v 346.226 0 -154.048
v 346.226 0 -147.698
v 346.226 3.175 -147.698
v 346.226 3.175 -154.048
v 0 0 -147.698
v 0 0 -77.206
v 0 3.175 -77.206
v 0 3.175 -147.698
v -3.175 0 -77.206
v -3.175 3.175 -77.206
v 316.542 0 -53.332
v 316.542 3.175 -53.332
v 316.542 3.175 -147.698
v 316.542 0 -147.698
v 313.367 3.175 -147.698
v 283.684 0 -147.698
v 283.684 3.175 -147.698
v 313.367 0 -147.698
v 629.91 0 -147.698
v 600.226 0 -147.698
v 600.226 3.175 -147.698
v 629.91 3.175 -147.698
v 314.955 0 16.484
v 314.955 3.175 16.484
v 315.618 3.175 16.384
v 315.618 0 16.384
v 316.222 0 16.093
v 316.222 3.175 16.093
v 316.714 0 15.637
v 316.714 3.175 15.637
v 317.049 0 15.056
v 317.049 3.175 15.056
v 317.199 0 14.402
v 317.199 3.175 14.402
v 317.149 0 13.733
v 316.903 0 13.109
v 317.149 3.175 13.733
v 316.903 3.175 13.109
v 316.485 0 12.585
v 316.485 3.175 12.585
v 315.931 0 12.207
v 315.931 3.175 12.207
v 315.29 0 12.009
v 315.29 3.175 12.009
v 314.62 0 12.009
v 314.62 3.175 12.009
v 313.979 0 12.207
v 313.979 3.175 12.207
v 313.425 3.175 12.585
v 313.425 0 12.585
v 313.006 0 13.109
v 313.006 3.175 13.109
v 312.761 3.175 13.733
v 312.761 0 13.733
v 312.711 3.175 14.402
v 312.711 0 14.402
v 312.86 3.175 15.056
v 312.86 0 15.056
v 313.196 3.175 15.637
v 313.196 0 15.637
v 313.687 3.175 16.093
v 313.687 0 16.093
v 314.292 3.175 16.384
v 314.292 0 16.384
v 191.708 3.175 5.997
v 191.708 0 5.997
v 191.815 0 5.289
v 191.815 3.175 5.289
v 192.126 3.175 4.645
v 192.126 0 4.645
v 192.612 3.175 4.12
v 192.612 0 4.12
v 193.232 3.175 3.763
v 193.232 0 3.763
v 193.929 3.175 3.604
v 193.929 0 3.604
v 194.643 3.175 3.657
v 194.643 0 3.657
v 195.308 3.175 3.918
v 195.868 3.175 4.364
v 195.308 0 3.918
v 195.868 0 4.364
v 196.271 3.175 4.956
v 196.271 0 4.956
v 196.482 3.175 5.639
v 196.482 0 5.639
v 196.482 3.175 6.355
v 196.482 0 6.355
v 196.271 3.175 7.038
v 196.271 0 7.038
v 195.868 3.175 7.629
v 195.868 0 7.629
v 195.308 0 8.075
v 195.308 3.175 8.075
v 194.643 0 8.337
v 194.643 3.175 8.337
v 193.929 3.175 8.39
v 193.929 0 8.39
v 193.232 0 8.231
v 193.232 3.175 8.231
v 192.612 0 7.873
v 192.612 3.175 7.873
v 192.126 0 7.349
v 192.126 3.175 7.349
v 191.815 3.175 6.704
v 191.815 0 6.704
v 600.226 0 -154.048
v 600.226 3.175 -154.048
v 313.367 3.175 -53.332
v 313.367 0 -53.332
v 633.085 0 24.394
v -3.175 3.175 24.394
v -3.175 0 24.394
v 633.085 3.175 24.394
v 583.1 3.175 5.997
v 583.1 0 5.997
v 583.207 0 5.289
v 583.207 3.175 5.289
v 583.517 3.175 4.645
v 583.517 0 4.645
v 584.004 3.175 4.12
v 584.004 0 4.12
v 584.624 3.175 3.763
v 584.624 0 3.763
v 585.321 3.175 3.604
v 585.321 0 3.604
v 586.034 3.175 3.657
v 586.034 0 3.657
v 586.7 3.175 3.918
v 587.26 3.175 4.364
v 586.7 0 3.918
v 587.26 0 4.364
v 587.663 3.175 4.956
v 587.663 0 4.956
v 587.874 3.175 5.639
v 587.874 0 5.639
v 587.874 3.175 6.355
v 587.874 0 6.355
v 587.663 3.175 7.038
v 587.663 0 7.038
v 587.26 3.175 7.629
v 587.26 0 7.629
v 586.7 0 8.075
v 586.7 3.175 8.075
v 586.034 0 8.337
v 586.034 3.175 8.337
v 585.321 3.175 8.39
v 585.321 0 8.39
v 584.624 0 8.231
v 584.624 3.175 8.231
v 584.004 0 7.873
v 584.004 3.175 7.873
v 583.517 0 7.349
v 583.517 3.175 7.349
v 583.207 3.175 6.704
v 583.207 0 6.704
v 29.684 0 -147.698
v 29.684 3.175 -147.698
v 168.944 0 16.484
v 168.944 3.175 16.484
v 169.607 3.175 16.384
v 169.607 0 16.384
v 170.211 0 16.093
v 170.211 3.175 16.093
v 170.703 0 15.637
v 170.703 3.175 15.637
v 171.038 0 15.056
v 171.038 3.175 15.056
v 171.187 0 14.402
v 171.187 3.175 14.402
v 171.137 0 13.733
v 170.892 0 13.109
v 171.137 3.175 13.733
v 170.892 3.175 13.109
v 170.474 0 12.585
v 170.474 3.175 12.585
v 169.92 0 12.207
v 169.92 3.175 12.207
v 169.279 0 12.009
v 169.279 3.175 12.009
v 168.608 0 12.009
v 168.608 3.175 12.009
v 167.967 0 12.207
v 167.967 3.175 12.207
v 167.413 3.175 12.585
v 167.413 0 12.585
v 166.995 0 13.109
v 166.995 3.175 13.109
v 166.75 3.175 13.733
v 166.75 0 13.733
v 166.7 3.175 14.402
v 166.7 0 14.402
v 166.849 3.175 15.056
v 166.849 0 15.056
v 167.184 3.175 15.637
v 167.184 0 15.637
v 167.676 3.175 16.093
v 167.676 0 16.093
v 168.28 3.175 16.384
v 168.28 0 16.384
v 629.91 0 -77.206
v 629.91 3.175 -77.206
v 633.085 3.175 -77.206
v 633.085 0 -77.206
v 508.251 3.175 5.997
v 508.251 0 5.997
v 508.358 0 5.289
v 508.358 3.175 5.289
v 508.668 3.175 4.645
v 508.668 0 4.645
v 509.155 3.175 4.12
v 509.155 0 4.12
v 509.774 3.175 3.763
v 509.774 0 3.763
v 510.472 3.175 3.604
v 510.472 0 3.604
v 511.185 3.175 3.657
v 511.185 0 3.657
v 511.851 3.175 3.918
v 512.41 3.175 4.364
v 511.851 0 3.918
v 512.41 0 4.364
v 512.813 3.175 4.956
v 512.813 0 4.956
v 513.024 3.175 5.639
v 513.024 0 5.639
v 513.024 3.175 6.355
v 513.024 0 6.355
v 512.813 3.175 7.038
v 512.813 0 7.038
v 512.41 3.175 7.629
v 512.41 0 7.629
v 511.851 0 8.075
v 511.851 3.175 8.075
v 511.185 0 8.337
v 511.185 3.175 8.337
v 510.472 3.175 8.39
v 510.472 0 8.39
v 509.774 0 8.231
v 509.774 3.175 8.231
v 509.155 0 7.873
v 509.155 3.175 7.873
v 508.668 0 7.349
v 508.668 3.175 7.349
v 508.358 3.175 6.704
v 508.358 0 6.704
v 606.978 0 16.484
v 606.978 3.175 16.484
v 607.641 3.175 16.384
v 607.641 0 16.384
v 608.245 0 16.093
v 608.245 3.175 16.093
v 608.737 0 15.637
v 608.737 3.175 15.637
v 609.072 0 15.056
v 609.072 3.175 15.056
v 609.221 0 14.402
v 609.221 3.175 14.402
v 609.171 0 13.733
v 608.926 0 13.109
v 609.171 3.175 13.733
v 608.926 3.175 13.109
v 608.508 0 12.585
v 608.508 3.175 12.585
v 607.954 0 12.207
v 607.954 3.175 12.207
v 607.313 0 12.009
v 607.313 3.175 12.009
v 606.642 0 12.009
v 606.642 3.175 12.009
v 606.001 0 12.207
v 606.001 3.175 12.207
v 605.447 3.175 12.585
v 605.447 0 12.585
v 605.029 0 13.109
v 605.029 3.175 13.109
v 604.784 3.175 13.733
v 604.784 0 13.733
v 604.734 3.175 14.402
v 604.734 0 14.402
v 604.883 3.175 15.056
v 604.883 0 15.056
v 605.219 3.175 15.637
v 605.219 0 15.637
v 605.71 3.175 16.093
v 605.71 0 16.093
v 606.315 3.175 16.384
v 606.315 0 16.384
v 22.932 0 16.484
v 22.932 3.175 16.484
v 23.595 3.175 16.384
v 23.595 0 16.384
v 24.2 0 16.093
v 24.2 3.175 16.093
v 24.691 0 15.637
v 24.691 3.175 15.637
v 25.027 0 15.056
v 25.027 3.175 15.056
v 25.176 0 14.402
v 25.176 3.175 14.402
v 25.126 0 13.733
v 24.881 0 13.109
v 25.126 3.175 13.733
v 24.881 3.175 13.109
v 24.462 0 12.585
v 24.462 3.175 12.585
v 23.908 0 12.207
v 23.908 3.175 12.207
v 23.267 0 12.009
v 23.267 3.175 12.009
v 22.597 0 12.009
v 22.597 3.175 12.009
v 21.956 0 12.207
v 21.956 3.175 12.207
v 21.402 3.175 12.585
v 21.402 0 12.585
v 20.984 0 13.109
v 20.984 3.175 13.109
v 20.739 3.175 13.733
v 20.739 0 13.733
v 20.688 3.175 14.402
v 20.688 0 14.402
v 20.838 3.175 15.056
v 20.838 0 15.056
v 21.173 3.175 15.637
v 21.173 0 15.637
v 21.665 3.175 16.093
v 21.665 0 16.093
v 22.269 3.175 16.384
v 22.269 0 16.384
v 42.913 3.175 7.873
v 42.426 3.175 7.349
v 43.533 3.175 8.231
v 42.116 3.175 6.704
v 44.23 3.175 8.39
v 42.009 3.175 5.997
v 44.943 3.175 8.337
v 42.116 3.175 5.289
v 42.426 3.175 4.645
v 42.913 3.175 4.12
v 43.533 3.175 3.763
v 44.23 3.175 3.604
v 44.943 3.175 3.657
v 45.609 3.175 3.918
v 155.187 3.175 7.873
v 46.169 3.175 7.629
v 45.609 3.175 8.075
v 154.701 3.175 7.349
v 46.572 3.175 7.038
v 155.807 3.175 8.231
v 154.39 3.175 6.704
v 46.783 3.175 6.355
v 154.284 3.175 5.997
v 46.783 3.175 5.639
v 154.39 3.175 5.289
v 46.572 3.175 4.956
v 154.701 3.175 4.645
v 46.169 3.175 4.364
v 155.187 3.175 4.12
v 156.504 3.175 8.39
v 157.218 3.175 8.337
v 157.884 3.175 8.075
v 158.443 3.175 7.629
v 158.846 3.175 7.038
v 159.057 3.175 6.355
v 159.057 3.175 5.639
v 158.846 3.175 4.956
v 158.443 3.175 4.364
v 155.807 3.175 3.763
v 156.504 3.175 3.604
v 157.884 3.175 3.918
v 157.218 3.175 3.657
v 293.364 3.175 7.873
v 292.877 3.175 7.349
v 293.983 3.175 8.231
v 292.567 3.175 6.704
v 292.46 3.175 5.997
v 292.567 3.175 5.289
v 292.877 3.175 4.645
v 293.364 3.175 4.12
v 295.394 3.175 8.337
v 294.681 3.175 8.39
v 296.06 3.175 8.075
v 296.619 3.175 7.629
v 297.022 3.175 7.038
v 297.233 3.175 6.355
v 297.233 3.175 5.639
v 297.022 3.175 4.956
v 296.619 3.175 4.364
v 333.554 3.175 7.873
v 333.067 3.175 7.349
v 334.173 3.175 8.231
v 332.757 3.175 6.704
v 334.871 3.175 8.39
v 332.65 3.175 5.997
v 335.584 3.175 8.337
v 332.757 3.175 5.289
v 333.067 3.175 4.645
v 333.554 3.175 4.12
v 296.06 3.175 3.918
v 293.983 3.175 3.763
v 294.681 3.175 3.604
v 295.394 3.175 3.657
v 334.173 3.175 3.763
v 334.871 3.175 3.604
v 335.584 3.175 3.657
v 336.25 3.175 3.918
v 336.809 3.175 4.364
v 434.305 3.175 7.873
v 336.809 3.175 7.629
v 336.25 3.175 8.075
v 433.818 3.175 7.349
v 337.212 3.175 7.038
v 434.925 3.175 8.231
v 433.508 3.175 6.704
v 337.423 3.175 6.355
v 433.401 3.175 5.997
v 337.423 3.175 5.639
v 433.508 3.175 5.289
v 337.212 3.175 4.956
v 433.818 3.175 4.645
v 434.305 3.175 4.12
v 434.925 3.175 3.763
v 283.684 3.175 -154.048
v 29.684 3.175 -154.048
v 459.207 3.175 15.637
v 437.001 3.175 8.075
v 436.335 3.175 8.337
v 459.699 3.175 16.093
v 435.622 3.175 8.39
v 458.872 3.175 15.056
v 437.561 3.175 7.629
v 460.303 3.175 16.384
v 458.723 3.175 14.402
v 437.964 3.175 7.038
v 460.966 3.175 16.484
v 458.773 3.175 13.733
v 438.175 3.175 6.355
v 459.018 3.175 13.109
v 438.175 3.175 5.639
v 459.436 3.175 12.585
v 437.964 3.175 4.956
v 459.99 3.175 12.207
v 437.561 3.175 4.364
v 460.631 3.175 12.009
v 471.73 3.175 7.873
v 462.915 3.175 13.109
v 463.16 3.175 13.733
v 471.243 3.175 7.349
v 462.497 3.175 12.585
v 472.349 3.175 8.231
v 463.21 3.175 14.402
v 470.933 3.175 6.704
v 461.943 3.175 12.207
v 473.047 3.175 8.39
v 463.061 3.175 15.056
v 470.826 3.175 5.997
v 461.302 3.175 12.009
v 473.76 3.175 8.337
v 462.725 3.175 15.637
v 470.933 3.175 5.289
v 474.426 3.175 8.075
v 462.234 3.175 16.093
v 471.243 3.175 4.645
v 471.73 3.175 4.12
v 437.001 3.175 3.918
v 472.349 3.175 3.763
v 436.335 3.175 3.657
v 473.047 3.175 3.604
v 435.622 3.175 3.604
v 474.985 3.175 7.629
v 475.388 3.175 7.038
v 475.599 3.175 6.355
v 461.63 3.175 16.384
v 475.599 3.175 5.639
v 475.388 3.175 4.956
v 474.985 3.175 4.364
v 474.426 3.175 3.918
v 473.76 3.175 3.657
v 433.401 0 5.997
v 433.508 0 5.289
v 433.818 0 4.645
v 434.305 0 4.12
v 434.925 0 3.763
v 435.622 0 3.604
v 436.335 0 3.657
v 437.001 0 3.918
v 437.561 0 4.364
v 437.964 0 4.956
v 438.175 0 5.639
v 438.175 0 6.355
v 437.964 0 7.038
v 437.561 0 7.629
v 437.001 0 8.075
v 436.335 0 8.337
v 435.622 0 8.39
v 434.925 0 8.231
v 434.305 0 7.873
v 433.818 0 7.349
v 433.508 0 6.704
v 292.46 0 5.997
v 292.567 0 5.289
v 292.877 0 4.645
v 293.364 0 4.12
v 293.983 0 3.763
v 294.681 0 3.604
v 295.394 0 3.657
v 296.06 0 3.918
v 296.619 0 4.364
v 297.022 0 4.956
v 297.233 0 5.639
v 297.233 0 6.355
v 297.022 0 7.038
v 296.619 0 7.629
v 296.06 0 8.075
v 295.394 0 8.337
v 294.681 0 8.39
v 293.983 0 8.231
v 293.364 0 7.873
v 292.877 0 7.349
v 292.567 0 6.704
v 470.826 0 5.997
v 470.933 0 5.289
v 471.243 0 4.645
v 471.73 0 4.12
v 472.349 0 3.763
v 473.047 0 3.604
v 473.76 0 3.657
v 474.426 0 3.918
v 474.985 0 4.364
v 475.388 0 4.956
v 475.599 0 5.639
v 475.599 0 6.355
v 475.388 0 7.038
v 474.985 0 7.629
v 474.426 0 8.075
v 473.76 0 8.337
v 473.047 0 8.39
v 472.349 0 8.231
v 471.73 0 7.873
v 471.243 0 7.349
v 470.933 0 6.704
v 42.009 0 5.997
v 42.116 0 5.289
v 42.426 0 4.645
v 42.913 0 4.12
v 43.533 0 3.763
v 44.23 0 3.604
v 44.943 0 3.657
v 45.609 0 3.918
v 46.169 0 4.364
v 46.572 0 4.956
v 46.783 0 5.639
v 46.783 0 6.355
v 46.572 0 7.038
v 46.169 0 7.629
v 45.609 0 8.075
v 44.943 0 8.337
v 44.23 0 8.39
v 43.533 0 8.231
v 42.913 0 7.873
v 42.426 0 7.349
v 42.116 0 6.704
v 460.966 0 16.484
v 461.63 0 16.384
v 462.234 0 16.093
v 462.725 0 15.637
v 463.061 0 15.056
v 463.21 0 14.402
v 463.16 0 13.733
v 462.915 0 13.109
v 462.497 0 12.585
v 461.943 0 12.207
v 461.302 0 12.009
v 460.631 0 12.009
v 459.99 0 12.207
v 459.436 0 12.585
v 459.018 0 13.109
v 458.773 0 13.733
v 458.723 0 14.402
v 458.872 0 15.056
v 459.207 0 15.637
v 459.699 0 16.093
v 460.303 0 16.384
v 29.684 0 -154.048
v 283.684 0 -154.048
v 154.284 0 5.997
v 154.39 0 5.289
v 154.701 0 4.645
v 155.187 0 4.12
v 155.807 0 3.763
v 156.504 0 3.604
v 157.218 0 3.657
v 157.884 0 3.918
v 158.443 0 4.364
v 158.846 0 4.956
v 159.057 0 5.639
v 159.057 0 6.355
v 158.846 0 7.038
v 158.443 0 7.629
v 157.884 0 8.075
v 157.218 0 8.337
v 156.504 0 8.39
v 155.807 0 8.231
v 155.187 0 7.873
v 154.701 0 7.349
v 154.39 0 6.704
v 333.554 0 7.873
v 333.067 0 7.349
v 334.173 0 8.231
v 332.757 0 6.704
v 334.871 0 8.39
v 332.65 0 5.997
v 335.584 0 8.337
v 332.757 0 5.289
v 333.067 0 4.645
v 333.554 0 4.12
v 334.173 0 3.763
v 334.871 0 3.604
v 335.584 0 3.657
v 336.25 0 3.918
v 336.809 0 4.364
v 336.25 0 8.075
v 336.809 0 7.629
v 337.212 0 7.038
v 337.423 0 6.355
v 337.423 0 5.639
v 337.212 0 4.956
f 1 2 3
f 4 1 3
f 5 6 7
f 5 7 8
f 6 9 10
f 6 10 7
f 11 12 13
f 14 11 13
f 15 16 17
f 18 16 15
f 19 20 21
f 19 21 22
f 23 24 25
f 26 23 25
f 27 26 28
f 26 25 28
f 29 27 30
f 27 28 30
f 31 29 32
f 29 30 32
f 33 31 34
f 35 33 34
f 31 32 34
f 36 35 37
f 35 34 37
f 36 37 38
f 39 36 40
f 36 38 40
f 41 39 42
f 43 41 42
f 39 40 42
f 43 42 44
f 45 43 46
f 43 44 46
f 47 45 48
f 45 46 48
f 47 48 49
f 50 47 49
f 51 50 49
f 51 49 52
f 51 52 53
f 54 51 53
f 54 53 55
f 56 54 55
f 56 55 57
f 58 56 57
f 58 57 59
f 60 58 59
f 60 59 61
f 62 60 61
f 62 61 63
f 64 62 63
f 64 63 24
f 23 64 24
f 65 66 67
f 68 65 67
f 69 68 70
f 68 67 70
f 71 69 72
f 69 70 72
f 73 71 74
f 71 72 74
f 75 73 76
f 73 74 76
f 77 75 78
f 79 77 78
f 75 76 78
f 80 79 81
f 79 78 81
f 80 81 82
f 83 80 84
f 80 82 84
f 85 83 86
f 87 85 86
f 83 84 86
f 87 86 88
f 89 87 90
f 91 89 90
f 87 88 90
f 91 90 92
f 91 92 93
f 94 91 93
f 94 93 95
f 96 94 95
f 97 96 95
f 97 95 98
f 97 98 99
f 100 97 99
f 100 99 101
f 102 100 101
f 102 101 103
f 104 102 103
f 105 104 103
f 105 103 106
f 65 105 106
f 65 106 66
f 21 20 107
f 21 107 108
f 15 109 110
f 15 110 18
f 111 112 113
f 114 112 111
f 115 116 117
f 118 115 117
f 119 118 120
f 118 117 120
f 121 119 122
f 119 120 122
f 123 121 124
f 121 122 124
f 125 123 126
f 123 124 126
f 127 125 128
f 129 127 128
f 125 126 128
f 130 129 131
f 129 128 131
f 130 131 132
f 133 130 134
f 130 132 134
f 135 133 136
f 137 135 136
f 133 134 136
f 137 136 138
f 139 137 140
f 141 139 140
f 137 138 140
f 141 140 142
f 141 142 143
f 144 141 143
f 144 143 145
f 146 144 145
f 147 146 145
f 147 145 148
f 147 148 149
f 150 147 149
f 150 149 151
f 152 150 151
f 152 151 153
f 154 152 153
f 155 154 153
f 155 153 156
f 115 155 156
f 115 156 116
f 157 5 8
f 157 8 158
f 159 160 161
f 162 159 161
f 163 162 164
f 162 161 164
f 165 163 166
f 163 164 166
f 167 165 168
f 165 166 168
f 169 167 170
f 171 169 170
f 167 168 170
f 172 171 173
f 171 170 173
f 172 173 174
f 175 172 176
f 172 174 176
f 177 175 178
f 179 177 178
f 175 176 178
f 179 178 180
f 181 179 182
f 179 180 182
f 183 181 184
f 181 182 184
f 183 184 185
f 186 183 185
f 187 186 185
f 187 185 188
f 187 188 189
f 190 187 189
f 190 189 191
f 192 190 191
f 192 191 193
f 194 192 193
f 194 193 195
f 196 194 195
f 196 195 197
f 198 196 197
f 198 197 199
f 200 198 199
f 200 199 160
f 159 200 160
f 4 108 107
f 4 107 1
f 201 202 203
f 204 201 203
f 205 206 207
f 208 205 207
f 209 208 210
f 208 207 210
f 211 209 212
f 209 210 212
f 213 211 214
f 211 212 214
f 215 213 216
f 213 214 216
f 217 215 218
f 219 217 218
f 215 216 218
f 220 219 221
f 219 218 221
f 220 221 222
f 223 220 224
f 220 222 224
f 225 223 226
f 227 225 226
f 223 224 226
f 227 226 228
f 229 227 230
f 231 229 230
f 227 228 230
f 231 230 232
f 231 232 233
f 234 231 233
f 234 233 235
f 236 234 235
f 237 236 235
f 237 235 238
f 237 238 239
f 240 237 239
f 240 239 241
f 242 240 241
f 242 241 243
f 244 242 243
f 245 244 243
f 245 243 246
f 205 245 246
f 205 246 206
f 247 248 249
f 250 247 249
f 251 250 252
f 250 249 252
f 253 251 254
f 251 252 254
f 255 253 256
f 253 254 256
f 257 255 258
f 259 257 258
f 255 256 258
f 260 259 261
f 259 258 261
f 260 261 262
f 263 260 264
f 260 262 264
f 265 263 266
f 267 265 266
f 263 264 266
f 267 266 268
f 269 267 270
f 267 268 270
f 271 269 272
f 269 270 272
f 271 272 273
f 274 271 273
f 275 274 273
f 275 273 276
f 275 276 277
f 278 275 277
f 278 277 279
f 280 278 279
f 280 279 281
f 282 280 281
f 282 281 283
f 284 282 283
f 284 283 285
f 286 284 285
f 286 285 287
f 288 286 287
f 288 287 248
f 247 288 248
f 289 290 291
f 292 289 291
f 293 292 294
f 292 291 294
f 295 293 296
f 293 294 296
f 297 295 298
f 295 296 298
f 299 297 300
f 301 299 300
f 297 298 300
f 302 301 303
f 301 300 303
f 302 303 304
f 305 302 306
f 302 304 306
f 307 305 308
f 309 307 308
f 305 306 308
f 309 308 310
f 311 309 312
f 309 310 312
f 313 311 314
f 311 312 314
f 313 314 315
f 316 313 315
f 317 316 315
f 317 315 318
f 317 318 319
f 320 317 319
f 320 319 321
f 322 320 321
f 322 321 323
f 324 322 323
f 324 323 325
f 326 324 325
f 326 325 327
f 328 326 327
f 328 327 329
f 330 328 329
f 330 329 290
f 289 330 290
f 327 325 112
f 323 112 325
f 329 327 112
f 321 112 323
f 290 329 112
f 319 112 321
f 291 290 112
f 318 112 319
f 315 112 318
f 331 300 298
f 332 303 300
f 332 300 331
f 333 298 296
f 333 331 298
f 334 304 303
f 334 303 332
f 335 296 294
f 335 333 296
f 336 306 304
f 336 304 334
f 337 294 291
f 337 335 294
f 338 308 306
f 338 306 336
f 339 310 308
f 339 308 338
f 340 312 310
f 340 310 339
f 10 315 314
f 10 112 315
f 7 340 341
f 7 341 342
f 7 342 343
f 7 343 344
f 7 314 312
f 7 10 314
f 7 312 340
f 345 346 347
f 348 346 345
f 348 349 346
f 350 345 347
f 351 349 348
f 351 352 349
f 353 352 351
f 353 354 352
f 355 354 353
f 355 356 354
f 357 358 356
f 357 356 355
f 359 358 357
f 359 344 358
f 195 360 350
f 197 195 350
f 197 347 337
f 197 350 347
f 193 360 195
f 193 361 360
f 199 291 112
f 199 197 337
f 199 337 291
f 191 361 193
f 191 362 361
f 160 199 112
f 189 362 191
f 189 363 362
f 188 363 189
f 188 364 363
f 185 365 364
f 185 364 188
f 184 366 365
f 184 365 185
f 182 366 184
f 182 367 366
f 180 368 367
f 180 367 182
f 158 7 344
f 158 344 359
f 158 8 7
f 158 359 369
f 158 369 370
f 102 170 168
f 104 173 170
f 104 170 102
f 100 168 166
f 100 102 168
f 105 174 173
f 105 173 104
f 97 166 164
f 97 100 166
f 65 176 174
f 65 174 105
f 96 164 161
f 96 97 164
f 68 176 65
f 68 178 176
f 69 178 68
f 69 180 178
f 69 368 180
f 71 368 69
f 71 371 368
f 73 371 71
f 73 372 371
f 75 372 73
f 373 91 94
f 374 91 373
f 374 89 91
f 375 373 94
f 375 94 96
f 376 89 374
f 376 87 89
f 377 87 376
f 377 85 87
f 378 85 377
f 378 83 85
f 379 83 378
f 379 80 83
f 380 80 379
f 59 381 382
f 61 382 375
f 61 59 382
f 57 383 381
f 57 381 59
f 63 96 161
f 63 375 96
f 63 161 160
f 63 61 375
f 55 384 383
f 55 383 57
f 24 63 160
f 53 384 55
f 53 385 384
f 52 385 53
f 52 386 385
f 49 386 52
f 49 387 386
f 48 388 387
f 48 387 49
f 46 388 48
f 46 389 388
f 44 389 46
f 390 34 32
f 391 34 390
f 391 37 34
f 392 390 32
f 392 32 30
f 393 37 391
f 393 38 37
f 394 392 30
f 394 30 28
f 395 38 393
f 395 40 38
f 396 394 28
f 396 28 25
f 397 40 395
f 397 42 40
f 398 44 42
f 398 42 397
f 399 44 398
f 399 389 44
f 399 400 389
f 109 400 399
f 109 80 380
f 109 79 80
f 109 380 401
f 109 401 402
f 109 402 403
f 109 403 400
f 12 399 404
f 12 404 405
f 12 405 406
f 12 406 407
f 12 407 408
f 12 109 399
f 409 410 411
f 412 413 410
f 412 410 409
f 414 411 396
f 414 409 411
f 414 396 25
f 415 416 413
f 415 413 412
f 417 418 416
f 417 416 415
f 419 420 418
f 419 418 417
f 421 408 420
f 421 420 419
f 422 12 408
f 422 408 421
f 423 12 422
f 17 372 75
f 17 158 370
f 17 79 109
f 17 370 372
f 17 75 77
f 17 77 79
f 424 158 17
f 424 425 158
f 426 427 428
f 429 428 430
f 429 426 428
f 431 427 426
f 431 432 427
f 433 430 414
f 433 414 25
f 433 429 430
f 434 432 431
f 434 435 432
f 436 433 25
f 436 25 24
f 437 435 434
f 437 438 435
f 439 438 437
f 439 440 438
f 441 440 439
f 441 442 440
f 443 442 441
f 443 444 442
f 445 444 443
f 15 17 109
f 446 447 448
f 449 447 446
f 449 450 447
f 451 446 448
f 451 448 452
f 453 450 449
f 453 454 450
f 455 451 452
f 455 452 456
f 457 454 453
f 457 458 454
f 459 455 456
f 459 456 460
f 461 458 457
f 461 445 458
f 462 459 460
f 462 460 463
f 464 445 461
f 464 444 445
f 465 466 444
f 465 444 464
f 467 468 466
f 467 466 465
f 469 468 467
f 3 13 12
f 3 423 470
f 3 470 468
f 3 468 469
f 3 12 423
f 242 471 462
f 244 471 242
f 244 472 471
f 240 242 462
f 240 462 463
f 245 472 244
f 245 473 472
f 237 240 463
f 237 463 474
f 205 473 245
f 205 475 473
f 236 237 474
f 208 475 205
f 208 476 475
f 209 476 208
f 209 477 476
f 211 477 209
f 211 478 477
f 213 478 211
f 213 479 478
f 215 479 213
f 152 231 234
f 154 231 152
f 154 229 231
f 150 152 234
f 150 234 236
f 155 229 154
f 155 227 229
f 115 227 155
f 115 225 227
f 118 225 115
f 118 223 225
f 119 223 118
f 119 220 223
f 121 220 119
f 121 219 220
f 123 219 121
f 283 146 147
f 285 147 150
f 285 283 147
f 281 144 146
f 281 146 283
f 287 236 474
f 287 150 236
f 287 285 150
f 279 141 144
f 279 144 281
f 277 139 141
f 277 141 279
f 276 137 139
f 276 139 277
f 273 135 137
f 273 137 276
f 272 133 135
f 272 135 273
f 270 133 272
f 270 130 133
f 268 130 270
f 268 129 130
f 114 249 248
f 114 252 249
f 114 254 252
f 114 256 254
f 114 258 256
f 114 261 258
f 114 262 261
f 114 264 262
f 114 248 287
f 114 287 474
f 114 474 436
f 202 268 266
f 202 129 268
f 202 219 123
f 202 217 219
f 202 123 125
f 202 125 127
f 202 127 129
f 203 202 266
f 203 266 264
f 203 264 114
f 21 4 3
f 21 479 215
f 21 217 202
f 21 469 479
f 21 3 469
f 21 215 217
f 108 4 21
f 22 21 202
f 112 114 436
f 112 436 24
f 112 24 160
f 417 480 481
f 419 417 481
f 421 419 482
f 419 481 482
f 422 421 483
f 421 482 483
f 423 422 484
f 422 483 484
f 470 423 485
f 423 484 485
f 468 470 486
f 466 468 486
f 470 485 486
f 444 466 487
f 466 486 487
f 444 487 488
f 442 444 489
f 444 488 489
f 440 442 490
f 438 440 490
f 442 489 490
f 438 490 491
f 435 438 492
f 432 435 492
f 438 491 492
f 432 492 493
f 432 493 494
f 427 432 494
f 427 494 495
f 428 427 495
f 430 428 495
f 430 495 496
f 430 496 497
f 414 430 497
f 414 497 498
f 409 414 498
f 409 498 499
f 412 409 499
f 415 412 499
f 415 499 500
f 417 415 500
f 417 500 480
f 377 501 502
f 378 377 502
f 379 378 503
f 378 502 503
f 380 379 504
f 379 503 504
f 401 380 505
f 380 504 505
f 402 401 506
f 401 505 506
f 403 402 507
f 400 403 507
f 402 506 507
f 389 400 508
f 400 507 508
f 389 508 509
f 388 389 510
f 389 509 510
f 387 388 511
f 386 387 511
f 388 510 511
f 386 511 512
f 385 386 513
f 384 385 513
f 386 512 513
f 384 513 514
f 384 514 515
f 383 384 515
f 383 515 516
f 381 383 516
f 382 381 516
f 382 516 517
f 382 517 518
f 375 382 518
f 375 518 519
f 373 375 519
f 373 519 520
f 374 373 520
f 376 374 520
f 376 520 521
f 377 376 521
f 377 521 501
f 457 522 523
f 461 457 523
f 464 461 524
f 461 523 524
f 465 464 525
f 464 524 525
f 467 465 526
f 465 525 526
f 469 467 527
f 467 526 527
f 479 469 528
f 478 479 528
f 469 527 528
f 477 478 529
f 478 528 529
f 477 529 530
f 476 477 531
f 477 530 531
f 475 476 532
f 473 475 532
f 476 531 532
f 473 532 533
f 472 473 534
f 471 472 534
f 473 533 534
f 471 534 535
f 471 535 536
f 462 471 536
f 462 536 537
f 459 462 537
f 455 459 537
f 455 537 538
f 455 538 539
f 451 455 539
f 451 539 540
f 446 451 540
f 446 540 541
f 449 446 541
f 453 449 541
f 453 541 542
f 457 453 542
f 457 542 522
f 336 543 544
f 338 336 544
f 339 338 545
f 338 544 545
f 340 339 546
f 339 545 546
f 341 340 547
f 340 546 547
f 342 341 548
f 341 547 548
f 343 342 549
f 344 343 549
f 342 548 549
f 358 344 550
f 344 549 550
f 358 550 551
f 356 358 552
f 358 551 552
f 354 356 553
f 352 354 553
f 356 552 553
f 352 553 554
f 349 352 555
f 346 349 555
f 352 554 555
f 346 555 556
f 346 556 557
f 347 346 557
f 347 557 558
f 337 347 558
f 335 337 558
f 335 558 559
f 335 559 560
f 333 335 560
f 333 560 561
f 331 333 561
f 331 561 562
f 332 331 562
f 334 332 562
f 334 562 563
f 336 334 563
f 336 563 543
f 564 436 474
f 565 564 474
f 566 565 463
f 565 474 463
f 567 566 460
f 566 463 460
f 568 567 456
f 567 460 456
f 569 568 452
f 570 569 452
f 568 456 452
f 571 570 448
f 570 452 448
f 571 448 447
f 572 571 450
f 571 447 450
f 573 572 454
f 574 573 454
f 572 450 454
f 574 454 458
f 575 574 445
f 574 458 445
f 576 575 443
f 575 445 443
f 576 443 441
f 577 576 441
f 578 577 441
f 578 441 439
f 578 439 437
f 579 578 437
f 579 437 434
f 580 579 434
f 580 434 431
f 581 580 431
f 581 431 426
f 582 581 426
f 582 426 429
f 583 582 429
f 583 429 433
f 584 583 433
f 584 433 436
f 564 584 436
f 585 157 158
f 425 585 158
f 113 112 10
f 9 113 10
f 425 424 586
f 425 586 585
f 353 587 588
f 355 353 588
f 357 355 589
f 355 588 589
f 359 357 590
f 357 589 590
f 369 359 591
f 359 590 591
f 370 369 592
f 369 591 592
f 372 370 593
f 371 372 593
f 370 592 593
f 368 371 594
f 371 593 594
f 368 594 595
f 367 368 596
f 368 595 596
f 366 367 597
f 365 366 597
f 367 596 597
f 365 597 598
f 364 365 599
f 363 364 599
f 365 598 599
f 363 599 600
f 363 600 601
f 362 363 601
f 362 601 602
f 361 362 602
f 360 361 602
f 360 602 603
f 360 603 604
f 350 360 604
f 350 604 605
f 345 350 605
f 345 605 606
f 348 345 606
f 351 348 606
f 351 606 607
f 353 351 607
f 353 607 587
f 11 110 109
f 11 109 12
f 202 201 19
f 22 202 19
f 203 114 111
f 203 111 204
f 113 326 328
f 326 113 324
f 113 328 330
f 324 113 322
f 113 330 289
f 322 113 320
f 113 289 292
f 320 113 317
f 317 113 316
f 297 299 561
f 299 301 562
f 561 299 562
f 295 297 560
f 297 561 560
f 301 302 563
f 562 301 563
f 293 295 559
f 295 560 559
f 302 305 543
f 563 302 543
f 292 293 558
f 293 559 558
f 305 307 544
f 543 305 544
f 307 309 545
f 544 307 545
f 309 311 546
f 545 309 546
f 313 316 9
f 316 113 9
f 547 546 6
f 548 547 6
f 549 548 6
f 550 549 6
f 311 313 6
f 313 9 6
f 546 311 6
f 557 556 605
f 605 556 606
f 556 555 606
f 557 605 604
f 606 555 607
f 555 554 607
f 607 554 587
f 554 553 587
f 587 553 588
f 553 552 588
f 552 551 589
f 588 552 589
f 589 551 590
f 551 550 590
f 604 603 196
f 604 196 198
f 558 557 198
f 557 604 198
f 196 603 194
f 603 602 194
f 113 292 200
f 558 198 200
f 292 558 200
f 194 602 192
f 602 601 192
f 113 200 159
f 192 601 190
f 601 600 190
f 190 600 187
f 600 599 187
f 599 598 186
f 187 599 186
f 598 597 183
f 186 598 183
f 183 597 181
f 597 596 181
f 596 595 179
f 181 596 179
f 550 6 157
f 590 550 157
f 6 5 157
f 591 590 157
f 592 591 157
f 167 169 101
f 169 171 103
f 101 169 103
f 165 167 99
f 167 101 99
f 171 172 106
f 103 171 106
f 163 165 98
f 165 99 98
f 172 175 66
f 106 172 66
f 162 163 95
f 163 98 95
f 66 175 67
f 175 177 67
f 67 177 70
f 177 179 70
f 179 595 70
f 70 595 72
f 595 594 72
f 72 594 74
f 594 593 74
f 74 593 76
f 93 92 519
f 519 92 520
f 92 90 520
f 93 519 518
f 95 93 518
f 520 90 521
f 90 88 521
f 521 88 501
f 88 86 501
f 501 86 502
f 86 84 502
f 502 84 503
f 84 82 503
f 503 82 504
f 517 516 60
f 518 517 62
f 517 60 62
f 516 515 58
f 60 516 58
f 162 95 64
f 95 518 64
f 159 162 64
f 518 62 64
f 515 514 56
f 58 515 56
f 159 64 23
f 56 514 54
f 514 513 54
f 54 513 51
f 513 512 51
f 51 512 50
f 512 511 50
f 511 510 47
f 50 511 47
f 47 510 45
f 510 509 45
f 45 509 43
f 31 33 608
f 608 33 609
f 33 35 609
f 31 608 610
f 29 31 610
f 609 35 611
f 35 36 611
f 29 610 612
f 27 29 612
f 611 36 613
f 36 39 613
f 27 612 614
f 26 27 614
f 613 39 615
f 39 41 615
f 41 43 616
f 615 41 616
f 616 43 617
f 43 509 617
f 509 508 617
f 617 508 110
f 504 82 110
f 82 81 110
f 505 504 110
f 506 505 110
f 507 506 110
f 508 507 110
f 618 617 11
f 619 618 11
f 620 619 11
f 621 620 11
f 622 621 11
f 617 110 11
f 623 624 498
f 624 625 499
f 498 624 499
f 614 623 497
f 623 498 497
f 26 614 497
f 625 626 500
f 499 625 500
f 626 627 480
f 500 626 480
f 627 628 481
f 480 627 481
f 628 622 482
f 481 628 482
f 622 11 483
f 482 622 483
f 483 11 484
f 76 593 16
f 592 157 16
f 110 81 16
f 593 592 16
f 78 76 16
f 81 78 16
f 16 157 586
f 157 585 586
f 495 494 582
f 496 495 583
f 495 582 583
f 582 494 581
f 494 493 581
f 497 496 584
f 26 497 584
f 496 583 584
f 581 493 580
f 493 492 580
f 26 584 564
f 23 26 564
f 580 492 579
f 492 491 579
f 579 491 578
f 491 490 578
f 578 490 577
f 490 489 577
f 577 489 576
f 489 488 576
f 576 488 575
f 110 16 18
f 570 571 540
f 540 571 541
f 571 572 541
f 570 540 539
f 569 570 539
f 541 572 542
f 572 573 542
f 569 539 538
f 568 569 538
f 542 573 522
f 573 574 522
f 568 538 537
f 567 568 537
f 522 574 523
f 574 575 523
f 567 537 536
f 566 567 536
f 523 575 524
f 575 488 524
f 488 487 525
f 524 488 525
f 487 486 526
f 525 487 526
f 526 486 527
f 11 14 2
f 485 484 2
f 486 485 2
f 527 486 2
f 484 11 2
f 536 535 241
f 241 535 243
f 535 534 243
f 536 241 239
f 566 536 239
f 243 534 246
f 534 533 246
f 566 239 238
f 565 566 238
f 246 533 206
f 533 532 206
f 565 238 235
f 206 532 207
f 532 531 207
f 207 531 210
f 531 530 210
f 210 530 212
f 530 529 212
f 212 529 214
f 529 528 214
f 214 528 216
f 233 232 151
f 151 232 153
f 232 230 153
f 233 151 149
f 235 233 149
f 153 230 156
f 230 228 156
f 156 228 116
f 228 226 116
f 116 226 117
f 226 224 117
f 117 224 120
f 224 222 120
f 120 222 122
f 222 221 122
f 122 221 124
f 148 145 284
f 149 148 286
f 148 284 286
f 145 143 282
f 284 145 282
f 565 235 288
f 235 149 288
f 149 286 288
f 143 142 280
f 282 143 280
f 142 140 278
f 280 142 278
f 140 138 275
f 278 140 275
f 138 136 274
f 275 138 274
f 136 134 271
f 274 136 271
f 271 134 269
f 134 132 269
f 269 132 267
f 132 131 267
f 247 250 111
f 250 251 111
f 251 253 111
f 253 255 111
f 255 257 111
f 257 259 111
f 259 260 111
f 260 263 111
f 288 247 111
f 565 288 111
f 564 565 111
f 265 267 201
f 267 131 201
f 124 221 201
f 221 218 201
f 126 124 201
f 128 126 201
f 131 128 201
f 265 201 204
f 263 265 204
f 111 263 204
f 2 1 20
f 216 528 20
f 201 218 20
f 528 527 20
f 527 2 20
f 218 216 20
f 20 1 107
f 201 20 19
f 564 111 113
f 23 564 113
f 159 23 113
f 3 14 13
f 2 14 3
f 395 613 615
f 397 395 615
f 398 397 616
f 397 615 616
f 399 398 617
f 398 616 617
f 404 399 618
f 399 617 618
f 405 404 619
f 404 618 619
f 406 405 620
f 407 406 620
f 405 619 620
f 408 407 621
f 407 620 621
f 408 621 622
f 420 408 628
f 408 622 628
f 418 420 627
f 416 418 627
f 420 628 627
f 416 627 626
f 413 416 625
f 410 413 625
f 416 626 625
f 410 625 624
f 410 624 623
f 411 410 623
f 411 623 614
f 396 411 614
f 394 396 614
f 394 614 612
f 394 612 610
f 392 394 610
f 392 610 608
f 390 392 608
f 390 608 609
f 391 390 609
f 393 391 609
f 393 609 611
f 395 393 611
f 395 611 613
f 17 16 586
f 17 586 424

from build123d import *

# Parameters (mm, degrees)
SKETCH1_W            = 629.90984
SKETCH1_H            = 147.69846
BOSS_EXTRUDE1_DEPTH  = 3.175
SKETCH3_W            = 254
SKETCH3_H            = 3.175
BOSS_EXTRUDE2_DEPTH  = 6.35
SKETCH4_W            = 3.175
SKETCH4_H            = 188.732840052
CUT_EXTRUDE1_DEPTH   = 3.175
SKETCH9_W            = 3.175
SKETCH9_H            = 77.20584
BOSS_EXTRUDE4_DEPTH  = 3.175
SKETCH10_W           = 636.25984
SKETCH10_H           = 24.39416
BOSS_EXTRUDE5_DEPTH  = 3.175
SKETCH13_R           = 2.25
CUT_EXTRUDE3_DEPTH   = 652.56536379
M4_CLEARANCE_HOLE1_D = 4.8


with BuildPart() as part:
    # Sketch1 → Boss-Extrude1 (new body)
    with BuildSketch(Plane(origin=(0, 0, 0), x_dir=(1, 0, 0), z_dir=(0, 1, 0))):
        with Locations((314.95492, 73.84923)):
            Rectangle(SKETCH1_W, SKETCH1_H)
    extrude(amount=BOSS_EXTRUDE1_DEPTH)

    # Sketch3 → Boss-Extrude2 (add)
    with BuildSketch(Plane(origin=(0, 0, -147.69846), x_dir=(-1, 0, 0), z_dir=(0, 0, -1))):
        with Locations((-473.22613, 1.5875)):
            Rectangle(SKETCH3_W, SKETCH3_H)
        with Locations((-156.68371, 1.5875)):
            Rectangle(SKETCH3_W, SKETCH3_H)
    extrude(amount=BOSS_EXTRUDE2_DEPTH)

    # Sketch4 → Cut-Extrude1 (cut)
    with BuildSketch(Plane(origin=(0, 3.175, 0), x_dir=(1, 0, 0), z_dir=(0, 1, 0))):
        with Locations((314.95492, 147.69846)):
            Rectangle(SKETCH4_W, SKETCH4_H)
    extrude(amount=-CUT_EXTRUDE1_DEPTH, mode=Mode.SUBTRACT)

    # Sketch9 → Boss-Extrude4 (add, through all)
    with BuildSketch(Plane.XZ):
        with Locations((-1.5875, -38.60292)):
            Rectangle(SKETCH9_W, SKETCH9_H)
        with Locations((631.49734, -38.60292)):
            Rectangle(SKETCH9_W, SKETCH9_H)
    extrude(amount=-BOSS_EXTRUDE4_DEPTH)

    # Sketch10 → Boss-Extrude5 (add, through all)
    with BuildSketch(Plane(origin=(0, 3.175, 0), x_dir=(1, 0, 0), z_dir=(0, 1, 0))):
        with Locations((314.95492, -12.19708)):
            Rectangle(SKETCH10_W, SKETCH10_H)
    extrude(amount=-BOSS_EXTRUDE5_DEPTH)

    # Sketch13 → Cut-Extrude3 (cut, through all)
    with BuildSketch(Plane(origin=(0, 3.175, 0), x_dir=(1, 0, 0), z_dir=(0, 1, 0))):
        with Locations(Location((606.977733219, -14.23416, 0), (0, 0, 270))):
            Circle(SKETCH13_R)
        with Locations(Location((460.966326609, -14.23416, 0), (0, 0, 270))):
            Circle(SKETCH13_R)
        with Locations(Location((314.95492, -14.23416, 0), (0, 0, 270))):
            Circle(SKETCH13_R)
        with Locations(Location((168.943513391, -14.23416, 0), (0, 0, 270))):
            Circle(SKETCH13_R)
        with Locations(Location((22.932106781, -14.23416, 0), (0, 0, 270))):
            Circle(SKETCH13_R)
    extrude(amount=-CUT_EXTRUDE3_DEPTH, mode=Mode.SUBTRACT)

    # M4 Clearance Hole1 (through all)
    with Locations(Plane(origin=(0, 3.175, 0), x_dir=(1, 0, 0), z_dir=(0, 1, 0))):
        with Locations((44.409412743, -5.996840051), (156.68371, -5.996840051), (194.108475752, -5.996840051), (294.859886505, -5.996840051), (335.049953495, -5.996840051), (435.801364248, -5.996840051), (473.22613, -5.996840051), (510.650895752, -5.996840051), (585.500427257, -5.996840051)):
            Hole(M4_CLEARANCE_HOLE1_D / 2)


solid = part.part
